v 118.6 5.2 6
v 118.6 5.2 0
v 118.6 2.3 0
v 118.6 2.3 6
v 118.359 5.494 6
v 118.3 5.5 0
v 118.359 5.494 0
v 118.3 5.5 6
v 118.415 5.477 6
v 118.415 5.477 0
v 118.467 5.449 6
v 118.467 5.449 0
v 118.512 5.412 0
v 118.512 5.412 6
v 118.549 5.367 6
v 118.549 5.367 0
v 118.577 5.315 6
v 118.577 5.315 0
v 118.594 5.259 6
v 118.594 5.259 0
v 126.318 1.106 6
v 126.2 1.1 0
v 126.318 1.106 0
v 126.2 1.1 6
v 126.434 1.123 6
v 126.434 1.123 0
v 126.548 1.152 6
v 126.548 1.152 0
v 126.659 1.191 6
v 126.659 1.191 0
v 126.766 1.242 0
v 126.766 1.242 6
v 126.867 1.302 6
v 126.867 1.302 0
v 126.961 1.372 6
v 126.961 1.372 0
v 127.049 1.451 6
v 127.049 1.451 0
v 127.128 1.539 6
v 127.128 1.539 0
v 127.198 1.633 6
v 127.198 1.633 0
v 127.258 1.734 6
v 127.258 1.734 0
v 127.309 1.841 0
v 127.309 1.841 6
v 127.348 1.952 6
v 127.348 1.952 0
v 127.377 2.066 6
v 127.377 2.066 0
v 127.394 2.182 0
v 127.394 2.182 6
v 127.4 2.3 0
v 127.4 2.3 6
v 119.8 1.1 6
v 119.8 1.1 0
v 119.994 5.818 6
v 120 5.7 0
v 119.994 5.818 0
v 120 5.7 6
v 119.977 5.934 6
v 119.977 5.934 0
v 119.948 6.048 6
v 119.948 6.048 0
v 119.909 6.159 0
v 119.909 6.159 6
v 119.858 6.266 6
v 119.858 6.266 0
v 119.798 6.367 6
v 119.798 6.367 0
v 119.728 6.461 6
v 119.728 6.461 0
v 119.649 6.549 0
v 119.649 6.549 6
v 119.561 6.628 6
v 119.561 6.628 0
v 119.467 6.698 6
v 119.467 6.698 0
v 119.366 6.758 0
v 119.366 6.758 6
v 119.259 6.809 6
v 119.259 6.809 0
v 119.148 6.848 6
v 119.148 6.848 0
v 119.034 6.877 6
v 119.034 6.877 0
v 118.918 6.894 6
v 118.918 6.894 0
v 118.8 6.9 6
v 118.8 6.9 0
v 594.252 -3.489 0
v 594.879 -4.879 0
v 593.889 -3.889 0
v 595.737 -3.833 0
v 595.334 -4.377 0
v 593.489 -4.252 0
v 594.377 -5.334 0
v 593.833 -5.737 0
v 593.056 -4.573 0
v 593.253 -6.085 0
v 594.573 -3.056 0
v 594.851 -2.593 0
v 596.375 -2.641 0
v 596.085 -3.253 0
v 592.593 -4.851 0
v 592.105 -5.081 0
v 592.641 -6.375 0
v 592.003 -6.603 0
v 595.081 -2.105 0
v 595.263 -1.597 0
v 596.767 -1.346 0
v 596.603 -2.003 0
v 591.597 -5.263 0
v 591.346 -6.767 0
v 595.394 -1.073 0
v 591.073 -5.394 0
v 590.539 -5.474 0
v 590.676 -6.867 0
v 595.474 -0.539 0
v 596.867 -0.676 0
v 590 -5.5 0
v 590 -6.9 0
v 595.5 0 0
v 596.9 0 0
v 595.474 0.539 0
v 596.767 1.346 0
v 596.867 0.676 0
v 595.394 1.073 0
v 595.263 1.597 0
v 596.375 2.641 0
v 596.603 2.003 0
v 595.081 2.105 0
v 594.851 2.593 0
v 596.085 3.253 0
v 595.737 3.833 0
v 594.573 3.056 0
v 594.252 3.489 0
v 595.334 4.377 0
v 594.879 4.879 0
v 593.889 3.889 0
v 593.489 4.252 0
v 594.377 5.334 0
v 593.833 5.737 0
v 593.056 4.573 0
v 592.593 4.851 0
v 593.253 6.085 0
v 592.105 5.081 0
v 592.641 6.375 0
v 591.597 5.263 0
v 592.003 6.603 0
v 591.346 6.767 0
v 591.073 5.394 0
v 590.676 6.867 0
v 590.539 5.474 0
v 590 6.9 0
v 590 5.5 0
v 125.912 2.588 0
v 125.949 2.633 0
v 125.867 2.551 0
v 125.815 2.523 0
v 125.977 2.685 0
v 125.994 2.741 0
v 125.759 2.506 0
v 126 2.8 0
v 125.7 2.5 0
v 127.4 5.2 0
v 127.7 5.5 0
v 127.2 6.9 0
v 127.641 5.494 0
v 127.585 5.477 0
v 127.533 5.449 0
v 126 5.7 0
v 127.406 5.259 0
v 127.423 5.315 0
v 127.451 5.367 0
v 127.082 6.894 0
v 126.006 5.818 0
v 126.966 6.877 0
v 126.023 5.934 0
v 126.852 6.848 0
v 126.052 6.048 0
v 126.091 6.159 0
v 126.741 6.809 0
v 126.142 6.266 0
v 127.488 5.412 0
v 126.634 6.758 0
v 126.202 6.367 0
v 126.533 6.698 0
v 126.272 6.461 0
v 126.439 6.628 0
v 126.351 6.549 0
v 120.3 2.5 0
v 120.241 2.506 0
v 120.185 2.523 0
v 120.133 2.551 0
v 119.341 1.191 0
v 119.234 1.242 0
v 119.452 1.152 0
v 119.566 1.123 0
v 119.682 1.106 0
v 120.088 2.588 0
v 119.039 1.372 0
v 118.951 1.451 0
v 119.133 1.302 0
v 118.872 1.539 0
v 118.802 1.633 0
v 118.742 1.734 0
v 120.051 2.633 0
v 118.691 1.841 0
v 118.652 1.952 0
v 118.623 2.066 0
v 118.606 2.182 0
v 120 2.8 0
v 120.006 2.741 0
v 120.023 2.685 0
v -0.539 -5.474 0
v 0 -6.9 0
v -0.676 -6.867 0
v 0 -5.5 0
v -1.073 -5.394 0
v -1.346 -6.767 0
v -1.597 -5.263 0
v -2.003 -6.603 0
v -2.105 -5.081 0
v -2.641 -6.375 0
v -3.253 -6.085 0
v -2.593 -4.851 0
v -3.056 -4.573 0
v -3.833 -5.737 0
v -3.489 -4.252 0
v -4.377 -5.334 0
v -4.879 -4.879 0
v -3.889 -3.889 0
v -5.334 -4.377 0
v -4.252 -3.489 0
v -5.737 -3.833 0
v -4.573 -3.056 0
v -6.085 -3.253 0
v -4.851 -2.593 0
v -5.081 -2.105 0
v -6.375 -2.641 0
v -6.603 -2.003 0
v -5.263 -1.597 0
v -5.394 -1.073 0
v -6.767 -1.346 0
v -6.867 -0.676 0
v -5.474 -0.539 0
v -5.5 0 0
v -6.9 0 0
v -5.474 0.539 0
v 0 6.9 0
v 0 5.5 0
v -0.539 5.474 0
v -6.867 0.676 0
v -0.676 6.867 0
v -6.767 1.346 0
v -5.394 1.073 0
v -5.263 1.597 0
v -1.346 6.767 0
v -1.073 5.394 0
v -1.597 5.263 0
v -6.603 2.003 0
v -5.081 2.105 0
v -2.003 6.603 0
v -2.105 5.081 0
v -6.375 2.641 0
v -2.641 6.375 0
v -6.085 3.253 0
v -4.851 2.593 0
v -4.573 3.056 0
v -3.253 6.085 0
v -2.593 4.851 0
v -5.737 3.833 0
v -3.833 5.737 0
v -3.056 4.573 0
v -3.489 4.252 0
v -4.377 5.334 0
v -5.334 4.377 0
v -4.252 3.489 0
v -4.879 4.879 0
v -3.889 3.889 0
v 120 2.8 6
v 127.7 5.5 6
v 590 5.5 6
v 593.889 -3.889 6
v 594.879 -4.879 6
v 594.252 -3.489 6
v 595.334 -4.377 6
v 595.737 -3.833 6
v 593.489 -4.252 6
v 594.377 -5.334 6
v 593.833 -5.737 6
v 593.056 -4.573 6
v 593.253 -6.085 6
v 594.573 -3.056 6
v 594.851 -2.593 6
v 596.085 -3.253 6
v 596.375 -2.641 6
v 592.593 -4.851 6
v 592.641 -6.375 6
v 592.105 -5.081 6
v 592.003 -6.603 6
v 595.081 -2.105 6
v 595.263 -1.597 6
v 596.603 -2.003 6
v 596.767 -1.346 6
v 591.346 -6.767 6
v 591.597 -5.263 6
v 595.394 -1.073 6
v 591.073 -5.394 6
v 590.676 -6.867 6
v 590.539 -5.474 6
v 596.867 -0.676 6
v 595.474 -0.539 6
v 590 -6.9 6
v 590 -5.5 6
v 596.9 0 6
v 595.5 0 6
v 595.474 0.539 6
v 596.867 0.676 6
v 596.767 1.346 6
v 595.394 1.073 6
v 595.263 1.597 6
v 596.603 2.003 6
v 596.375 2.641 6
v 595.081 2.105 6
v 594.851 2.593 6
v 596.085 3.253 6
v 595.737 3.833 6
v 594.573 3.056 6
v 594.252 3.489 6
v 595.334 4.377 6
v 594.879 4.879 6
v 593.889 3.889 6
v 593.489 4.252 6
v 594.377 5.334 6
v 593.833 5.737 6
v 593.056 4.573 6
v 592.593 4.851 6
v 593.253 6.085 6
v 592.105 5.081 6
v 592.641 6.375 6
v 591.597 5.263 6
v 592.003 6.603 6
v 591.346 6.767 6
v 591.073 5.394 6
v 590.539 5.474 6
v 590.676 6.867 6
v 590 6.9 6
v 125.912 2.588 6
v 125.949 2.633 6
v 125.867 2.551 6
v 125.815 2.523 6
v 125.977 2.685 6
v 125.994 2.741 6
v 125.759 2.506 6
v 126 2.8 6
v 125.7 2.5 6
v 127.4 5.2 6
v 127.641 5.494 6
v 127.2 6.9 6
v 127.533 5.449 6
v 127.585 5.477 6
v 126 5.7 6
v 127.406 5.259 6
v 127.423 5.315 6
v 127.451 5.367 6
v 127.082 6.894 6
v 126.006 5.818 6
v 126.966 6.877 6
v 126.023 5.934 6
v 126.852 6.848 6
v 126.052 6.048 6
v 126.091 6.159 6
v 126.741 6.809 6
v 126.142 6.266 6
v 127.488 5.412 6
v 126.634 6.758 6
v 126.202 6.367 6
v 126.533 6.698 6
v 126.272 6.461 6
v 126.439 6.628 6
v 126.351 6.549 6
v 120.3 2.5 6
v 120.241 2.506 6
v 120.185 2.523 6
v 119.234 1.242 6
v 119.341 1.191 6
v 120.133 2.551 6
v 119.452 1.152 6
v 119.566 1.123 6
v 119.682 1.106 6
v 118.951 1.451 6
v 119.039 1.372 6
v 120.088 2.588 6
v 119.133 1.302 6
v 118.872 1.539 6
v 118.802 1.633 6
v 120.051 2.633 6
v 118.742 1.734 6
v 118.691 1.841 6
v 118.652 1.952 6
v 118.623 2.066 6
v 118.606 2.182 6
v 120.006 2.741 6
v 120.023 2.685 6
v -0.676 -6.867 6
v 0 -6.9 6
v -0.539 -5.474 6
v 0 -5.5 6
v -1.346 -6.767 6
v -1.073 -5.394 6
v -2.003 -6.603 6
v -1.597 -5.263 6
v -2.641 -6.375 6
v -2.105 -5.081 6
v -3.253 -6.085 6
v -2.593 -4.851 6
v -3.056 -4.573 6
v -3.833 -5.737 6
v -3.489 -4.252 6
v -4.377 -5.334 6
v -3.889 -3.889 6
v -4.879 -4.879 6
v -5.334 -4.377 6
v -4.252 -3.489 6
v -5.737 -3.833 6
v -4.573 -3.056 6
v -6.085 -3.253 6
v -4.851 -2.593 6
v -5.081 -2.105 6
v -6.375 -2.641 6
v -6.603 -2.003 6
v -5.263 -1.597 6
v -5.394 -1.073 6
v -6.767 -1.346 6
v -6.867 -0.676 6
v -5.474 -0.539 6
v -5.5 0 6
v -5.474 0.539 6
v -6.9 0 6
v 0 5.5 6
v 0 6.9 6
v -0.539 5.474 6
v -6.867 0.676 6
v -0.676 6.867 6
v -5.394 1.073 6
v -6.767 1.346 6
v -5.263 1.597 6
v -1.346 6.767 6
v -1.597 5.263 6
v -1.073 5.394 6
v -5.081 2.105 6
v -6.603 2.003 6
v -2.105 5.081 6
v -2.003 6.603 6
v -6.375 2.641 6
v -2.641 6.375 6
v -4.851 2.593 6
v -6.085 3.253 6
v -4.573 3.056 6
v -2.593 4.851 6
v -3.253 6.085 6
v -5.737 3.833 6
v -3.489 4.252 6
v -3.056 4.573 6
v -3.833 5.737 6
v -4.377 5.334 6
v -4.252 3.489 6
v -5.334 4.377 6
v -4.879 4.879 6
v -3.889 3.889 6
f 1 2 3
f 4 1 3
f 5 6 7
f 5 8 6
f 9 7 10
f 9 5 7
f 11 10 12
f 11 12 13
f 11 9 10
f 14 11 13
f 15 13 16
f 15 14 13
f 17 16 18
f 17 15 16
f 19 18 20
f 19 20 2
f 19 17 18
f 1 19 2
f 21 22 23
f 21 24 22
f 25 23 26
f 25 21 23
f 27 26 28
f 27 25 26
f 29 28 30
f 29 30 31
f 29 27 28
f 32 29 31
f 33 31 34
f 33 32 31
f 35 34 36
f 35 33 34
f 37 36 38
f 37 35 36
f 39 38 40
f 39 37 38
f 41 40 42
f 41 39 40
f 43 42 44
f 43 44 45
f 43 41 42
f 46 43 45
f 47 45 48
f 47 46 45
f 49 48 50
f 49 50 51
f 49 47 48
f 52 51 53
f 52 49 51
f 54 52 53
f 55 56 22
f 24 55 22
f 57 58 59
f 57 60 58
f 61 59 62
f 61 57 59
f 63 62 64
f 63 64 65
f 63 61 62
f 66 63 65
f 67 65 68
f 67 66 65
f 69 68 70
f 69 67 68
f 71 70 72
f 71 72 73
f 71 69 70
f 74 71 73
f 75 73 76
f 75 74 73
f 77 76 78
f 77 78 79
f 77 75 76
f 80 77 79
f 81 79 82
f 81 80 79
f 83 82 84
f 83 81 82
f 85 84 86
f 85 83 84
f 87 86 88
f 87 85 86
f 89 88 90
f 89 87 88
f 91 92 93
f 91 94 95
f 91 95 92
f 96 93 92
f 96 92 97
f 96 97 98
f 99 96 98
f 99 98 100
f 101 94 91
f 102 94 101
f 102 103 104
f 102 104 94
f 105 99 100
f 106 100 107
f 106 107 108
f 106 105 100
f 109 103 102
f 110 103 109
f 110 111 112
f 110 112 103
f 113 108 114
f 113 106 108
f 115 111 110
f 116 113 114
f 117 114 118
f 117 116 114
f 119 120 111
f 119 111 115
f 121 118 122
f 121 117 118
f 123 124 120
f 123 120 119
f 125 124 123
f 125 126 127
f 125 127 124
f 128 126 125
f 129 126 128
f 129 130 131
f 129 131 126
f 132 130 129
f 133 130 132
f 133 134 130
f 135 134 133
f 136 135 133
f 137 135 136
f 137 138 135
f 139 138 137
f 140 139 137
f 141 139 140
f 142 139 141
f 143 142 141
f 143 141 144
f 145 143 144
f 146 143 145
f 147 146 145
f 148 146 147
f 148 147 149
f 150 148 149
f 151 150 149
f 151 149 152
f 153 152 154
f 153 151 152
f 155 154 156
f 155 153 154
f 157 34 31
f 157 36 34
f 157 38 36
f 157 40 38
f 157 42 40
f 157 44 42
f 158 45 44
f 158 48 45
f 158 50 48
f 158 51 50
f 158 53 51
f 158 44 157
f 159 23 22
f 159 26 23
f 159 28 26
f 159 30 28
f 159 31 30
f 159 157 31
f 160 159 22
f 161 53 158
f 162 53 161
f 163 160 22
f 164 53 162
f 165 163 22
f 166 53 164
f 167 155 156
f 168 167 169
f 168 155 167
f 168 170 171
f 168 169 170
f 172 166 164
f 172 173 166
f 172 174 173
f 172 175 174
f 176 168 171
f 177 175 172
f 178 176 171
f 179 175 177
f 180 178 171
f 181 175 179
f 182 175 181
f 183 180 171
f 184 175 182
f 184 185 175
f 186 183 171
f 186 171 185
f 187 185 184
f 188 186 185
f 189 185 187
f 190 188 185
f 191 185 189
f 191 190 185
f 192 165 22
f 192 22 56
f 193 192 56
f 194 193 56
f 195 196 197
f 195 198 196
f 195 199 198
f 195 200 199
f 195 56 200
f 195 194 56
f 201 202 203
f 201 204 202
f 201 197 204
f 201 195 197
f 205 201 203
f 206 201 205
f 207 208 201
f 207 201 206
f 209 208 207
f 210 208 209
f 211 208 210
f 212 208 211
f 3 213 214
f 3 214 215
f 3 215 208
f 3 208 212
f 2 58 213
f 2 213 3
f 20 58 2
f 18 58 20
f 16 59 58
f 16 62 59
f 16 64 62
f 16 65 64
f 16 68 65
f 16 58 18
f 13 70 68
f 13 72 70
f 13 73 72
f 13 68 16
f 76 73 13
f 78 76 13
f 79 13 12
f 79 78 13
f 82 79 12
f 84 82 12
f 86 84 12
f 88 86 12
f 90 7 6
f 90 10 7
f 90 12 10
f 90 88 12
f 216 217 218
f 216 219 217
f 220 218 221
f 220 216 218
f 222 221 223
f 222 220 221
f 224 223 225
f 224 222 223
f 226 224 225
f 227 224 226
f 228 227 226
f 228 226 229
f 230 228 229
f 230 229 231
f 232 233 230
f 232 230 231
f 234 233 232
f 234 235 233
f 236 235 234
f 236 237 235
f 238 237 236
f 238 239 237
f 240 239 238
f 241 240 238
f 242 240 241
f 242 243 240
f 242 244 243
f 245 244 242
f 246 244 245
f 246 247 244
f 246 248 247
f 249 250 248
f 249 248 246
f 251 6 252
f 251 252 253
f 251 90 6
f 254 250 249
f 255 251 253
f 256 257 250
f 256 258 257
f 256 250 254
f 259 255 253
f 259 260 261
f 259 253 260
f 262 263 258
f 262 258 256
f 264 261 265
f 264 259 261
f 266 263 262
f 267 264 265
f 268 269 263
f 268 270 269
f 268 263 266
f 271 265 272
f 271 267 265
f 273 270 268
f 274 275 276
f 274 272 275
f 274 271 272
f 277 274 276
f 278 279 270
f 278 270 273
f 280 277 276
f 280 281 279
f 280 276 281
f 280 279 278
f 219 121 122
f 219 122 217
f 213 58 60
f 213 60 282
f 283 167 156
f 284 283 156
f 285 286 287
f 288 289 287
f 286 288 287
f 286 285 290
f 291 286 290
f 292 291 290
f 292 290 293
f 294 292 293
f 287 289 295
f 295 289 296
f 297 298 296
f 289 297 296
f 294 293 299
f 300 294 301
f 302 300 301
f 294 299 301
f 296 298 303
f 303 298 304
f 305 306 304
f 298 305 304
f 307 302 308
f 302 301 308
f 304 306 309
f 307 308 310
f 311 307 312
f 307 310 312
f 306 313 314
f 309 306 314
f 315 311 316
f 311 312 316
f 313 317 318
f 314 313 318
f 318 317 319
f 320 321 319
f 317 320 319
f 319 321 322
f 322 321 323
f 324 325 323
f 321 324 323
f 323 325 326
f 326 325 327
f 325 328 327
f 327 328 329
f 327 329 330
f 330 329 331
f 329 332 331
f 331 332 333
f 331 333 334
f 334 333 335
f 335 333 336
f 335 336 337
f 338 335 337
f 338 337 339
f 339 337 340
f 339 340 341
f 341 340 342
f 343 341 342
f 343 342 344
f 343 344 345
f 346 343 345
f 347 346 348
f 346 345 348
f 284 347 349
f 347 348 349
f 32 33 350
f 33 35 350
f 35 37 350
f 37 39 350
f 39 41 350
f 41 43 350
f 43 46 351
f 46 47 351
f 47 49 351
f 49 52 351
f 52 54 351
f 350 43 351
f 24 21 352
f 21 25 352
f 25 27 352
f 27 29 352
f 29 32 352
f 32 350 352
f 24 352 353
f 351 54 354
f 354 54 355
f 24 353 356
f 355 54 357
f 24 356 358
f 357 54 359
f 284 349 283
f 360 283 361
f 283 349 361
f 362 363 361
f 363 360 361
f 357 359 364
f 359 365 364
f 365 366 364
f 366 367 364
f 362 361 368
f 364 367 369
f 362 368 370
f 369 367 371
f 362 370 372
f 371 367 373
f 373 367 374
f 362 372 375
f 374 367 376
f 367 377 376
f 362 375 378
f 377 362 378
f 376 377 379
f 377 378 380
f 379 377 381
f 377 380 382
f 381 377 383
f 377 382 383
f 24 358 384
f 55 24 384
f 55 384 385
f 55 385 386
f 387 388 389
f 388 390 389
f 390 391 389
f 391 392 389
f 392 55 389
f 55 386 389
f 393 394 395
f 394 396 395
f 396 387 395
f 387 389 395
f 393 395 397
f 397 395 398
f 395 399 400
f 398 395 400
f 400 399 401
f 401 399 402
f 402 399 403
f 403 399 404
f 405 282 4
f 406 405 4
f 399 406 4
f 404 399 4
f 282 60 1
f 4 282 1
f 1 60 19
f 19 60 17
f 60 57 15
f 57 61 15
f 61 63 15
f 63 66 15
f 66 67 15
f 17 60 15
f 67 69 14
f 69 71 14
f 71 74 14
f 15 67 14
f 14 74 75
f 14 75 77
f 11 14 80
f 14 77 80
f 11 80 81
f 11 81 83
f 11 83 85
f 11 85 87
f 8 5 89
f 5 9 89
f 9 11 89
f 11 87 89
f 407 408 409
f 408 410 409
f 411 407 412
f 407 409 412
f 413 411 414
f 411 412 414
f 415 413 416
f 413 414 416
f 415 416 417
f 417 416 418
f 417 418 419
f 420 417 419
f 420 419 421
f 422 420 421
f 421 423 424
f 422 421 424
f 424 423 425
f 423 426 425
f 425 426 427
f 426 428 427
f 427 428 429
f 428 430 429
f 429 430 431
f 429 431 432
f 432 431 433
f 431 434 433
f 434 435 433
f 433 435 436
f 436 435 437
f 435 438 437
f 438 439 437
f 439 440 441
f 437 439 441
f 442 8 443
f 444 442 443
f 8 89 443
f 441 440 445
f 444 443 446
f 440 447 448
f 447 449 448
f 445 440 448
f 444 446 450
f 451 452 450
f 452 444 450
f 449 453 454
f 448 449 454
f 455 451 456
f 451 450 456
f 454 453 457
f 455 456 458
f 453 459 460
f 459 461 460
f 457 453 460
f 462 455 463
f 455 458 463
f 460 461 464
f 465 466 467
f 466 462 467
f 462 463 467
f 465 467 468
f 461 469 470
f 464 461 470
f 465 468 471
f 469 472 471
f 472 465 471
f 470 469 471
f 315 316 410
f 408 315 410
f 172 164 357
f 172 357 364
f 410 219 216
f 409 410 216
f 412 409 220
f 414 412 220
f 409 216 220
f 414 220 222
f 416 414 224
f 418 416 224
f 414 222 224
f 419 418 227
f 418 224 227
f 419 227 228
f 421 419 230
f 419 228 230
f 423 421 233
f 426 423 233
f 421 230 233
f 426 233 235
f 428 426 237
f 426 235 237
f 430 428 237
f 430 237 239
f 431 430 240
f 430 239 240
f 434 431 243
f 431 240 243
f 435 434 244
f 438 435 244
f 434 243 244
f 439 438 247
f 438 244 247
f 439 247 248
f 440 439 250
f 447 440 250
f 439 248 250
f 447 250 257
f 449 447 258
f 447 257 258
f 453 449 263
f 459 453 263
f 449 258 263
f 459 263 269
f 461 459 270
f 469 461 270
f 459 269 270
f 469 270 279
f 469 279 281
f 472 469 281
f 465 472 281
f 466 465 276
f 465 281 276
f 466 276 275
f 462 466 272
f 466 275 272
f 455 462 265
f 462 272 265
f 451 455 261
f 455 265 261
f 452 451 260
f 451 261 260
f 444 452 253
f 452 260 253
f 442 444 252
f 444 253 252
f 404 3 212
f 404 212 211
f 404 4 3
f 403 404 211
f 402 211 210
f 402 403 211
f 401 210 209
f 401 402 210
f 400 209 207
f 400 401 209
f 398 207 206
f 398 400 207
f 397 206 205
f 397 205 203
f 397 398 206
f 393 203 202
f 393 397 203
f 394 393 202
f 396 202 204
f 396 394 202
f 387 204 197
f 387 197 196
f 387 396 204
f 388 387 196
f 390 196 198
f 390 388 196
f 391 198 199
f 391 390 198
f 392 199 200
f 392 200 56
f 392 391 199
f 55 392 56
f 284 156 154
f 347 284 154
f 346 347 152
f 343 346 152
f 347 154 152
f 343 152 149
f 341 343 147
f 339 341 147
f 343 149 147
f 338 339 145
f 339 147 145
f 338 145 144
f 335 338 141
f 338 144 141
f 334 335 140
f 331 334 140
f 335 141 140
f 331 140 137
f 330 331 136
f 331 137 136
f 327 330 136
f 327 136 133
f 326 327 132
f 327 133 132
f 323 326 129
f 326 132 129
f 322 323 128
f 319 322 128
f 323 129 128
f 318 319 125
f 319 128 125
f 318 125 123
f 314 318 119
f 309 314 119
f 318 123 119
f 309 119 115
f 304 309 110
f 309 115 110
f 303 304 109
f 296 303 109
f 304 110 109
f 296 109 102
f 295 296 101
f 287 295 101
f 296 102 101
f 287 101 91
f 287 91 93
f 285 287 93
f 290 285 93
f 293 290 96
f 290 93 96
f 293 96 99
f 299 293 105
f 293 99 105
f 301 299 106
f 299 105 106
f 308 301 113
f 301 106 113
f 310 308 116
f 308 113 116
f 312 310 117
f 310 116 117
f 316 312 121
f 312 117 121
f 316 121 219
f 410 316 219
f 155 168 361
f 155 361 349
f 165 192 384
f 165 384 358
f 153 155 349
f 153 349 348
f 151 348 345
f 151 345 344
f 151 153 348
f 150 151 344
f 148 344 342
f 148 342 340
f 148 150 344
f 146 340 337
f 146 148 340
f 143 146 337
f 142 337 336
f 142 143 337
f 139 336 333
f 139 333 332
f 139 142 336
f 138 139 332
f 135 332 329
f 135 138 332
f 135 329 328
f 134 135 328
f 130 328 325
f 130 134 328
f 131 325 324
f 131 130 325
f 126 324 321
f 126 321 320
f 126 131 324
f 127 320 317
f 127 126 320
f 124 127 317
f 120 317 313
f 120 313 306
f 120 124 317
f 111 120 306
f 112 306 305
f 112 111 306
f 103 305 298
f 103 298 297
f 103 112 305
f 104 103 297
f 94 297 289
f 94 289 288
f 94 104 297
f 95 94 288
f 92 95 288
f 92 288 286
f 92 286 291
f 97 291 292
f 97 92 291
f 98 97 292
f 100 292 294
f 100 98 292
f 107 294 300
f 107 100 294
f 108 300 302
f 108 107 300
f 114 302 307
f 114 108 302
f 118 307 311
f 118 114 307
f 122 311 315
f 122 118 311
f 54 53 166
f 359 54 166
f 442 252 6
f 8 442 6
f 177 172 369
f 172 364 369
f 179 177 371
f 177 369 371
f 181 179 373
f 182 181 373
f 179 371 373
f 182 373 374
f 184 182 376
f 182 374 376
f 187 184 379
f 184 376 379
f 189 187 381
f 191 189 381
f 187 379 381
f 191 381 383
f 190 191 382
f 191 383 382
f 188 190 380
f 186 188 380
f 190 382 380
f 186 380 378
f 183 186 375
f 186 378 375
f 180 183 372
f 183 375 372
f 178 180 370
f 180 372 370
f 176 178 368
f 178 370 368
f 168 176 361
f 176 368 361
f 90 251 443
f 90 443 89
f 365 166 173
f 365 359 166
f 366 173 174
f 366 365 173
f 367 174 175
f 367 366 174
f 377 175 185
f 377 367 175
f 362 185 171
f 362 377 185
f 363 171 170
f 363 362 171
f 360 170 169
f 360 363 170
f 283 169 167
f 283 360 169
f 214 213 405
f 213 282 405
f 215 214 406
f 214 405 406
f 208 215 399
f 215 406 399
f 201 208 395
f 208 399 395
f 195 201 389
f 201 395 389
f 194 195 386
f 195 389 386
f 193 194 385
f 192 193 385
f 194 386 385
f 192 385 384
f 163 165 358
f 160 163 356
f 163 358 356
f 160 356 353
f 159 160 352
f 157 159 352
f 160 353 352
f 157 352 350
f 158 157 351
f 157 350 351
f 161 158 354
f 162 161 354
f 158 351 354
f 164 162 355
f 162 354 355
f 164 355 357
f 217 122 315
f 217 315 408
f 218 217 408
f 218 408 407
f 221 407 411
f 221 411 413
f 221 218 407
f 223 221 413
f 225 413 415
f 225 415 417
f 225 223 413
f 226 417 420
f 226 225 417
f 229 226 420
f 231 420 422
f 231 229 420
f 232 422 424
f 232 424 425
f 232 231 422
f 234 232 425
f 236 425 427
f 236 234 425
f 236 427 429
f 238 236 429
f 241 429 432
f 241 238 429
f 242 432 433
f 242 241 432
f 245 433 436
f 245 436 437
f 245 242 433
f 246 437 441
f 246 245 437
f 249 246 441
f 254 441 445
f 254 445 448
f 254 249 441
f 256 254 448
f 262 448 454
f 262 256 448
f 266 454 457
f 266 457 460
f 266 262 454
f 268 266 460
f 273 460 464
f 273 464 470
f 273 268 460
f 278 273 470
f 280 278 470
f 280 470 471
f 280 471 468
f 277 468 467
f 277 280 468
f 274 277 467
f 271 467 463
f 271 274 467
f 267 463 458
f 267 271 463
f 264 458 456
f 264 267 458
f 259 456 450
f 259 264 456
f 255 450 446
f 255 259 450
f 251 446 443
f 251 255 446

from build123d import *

# Parameters (mm, degrees)
SALIENTE_EXTRUIR1_DEPTH = 6
REDONDEO1_R             = 0.3
REDONDEO2_R             = 1.2


with BuildPart() as part:
    # Croquis1 → Saliente-Extruir1 (new body)
    with BuildSketch(Plane.XY):
        with BuildLine():
            Line((0, 6.9), (120, 6.9))
            Line((120, 6.9), (120, 2.5))
            Line((120, 2.5), (126, 2.5))
            Line((126, 2.5), (126, 6.9))
            Line((126, 6.9), (590, 6.9))
            ThreePointArc((590, 6.9), (596.9, 0), (590, -6.9))
            Line((590, -6.9), (0, -6.9))
            ThreePointArc((0, -6.9), (-6.9, 0), (0, 6.9))
        make_face()
        with BuildLine():
            Line((0, 5.5), (118.6, 5.5))
            Line((118.6, 5.5), (118.6, 1.1))
            Line((118.6, 1.1), (127.4, 1.1))
            Line((127.4, 1.1), (127.4, 5.5))
            Line((127.4, 5.5), (590, 5.5))
            ThreePointArc((590, 5.5), (595.5, 0), (590, -5.5))
            Line((590, -5.5), (0, -5.5))
            ThreePointArc((0, -5.5), (-5.5, 0), (0, 5.5))
        make_face(mode=Mode.SUBTRACT)
    extrude(amount=SALIENTE_EXTRUIR1_DEPTH)

    # Redondeo1
    redondeo1_edges = [part.edges().sort_by_distance(p)[0] for p in [
        (120, 2.5, 3),
        (126, 2.5, 3),
        (127.4, 5.5, 3),
        (118.6, 5.5, 3),
    ]]
    fillet(redondeo1_edges, radius=REDONDEO1_R)

    # Redondeo2
    redondeo2_edges = [part.edges().sort_by_distance(p)[0] for p in [
        (120, 6.9, 3),
        (126, 6.9, 3),
        (127.4, 1.1, 3),
        (118.6, 1.1, 3),
    ]]
    fillet(redondeo2_edges, radius=REDONDEO2_R)


solid = part.part
